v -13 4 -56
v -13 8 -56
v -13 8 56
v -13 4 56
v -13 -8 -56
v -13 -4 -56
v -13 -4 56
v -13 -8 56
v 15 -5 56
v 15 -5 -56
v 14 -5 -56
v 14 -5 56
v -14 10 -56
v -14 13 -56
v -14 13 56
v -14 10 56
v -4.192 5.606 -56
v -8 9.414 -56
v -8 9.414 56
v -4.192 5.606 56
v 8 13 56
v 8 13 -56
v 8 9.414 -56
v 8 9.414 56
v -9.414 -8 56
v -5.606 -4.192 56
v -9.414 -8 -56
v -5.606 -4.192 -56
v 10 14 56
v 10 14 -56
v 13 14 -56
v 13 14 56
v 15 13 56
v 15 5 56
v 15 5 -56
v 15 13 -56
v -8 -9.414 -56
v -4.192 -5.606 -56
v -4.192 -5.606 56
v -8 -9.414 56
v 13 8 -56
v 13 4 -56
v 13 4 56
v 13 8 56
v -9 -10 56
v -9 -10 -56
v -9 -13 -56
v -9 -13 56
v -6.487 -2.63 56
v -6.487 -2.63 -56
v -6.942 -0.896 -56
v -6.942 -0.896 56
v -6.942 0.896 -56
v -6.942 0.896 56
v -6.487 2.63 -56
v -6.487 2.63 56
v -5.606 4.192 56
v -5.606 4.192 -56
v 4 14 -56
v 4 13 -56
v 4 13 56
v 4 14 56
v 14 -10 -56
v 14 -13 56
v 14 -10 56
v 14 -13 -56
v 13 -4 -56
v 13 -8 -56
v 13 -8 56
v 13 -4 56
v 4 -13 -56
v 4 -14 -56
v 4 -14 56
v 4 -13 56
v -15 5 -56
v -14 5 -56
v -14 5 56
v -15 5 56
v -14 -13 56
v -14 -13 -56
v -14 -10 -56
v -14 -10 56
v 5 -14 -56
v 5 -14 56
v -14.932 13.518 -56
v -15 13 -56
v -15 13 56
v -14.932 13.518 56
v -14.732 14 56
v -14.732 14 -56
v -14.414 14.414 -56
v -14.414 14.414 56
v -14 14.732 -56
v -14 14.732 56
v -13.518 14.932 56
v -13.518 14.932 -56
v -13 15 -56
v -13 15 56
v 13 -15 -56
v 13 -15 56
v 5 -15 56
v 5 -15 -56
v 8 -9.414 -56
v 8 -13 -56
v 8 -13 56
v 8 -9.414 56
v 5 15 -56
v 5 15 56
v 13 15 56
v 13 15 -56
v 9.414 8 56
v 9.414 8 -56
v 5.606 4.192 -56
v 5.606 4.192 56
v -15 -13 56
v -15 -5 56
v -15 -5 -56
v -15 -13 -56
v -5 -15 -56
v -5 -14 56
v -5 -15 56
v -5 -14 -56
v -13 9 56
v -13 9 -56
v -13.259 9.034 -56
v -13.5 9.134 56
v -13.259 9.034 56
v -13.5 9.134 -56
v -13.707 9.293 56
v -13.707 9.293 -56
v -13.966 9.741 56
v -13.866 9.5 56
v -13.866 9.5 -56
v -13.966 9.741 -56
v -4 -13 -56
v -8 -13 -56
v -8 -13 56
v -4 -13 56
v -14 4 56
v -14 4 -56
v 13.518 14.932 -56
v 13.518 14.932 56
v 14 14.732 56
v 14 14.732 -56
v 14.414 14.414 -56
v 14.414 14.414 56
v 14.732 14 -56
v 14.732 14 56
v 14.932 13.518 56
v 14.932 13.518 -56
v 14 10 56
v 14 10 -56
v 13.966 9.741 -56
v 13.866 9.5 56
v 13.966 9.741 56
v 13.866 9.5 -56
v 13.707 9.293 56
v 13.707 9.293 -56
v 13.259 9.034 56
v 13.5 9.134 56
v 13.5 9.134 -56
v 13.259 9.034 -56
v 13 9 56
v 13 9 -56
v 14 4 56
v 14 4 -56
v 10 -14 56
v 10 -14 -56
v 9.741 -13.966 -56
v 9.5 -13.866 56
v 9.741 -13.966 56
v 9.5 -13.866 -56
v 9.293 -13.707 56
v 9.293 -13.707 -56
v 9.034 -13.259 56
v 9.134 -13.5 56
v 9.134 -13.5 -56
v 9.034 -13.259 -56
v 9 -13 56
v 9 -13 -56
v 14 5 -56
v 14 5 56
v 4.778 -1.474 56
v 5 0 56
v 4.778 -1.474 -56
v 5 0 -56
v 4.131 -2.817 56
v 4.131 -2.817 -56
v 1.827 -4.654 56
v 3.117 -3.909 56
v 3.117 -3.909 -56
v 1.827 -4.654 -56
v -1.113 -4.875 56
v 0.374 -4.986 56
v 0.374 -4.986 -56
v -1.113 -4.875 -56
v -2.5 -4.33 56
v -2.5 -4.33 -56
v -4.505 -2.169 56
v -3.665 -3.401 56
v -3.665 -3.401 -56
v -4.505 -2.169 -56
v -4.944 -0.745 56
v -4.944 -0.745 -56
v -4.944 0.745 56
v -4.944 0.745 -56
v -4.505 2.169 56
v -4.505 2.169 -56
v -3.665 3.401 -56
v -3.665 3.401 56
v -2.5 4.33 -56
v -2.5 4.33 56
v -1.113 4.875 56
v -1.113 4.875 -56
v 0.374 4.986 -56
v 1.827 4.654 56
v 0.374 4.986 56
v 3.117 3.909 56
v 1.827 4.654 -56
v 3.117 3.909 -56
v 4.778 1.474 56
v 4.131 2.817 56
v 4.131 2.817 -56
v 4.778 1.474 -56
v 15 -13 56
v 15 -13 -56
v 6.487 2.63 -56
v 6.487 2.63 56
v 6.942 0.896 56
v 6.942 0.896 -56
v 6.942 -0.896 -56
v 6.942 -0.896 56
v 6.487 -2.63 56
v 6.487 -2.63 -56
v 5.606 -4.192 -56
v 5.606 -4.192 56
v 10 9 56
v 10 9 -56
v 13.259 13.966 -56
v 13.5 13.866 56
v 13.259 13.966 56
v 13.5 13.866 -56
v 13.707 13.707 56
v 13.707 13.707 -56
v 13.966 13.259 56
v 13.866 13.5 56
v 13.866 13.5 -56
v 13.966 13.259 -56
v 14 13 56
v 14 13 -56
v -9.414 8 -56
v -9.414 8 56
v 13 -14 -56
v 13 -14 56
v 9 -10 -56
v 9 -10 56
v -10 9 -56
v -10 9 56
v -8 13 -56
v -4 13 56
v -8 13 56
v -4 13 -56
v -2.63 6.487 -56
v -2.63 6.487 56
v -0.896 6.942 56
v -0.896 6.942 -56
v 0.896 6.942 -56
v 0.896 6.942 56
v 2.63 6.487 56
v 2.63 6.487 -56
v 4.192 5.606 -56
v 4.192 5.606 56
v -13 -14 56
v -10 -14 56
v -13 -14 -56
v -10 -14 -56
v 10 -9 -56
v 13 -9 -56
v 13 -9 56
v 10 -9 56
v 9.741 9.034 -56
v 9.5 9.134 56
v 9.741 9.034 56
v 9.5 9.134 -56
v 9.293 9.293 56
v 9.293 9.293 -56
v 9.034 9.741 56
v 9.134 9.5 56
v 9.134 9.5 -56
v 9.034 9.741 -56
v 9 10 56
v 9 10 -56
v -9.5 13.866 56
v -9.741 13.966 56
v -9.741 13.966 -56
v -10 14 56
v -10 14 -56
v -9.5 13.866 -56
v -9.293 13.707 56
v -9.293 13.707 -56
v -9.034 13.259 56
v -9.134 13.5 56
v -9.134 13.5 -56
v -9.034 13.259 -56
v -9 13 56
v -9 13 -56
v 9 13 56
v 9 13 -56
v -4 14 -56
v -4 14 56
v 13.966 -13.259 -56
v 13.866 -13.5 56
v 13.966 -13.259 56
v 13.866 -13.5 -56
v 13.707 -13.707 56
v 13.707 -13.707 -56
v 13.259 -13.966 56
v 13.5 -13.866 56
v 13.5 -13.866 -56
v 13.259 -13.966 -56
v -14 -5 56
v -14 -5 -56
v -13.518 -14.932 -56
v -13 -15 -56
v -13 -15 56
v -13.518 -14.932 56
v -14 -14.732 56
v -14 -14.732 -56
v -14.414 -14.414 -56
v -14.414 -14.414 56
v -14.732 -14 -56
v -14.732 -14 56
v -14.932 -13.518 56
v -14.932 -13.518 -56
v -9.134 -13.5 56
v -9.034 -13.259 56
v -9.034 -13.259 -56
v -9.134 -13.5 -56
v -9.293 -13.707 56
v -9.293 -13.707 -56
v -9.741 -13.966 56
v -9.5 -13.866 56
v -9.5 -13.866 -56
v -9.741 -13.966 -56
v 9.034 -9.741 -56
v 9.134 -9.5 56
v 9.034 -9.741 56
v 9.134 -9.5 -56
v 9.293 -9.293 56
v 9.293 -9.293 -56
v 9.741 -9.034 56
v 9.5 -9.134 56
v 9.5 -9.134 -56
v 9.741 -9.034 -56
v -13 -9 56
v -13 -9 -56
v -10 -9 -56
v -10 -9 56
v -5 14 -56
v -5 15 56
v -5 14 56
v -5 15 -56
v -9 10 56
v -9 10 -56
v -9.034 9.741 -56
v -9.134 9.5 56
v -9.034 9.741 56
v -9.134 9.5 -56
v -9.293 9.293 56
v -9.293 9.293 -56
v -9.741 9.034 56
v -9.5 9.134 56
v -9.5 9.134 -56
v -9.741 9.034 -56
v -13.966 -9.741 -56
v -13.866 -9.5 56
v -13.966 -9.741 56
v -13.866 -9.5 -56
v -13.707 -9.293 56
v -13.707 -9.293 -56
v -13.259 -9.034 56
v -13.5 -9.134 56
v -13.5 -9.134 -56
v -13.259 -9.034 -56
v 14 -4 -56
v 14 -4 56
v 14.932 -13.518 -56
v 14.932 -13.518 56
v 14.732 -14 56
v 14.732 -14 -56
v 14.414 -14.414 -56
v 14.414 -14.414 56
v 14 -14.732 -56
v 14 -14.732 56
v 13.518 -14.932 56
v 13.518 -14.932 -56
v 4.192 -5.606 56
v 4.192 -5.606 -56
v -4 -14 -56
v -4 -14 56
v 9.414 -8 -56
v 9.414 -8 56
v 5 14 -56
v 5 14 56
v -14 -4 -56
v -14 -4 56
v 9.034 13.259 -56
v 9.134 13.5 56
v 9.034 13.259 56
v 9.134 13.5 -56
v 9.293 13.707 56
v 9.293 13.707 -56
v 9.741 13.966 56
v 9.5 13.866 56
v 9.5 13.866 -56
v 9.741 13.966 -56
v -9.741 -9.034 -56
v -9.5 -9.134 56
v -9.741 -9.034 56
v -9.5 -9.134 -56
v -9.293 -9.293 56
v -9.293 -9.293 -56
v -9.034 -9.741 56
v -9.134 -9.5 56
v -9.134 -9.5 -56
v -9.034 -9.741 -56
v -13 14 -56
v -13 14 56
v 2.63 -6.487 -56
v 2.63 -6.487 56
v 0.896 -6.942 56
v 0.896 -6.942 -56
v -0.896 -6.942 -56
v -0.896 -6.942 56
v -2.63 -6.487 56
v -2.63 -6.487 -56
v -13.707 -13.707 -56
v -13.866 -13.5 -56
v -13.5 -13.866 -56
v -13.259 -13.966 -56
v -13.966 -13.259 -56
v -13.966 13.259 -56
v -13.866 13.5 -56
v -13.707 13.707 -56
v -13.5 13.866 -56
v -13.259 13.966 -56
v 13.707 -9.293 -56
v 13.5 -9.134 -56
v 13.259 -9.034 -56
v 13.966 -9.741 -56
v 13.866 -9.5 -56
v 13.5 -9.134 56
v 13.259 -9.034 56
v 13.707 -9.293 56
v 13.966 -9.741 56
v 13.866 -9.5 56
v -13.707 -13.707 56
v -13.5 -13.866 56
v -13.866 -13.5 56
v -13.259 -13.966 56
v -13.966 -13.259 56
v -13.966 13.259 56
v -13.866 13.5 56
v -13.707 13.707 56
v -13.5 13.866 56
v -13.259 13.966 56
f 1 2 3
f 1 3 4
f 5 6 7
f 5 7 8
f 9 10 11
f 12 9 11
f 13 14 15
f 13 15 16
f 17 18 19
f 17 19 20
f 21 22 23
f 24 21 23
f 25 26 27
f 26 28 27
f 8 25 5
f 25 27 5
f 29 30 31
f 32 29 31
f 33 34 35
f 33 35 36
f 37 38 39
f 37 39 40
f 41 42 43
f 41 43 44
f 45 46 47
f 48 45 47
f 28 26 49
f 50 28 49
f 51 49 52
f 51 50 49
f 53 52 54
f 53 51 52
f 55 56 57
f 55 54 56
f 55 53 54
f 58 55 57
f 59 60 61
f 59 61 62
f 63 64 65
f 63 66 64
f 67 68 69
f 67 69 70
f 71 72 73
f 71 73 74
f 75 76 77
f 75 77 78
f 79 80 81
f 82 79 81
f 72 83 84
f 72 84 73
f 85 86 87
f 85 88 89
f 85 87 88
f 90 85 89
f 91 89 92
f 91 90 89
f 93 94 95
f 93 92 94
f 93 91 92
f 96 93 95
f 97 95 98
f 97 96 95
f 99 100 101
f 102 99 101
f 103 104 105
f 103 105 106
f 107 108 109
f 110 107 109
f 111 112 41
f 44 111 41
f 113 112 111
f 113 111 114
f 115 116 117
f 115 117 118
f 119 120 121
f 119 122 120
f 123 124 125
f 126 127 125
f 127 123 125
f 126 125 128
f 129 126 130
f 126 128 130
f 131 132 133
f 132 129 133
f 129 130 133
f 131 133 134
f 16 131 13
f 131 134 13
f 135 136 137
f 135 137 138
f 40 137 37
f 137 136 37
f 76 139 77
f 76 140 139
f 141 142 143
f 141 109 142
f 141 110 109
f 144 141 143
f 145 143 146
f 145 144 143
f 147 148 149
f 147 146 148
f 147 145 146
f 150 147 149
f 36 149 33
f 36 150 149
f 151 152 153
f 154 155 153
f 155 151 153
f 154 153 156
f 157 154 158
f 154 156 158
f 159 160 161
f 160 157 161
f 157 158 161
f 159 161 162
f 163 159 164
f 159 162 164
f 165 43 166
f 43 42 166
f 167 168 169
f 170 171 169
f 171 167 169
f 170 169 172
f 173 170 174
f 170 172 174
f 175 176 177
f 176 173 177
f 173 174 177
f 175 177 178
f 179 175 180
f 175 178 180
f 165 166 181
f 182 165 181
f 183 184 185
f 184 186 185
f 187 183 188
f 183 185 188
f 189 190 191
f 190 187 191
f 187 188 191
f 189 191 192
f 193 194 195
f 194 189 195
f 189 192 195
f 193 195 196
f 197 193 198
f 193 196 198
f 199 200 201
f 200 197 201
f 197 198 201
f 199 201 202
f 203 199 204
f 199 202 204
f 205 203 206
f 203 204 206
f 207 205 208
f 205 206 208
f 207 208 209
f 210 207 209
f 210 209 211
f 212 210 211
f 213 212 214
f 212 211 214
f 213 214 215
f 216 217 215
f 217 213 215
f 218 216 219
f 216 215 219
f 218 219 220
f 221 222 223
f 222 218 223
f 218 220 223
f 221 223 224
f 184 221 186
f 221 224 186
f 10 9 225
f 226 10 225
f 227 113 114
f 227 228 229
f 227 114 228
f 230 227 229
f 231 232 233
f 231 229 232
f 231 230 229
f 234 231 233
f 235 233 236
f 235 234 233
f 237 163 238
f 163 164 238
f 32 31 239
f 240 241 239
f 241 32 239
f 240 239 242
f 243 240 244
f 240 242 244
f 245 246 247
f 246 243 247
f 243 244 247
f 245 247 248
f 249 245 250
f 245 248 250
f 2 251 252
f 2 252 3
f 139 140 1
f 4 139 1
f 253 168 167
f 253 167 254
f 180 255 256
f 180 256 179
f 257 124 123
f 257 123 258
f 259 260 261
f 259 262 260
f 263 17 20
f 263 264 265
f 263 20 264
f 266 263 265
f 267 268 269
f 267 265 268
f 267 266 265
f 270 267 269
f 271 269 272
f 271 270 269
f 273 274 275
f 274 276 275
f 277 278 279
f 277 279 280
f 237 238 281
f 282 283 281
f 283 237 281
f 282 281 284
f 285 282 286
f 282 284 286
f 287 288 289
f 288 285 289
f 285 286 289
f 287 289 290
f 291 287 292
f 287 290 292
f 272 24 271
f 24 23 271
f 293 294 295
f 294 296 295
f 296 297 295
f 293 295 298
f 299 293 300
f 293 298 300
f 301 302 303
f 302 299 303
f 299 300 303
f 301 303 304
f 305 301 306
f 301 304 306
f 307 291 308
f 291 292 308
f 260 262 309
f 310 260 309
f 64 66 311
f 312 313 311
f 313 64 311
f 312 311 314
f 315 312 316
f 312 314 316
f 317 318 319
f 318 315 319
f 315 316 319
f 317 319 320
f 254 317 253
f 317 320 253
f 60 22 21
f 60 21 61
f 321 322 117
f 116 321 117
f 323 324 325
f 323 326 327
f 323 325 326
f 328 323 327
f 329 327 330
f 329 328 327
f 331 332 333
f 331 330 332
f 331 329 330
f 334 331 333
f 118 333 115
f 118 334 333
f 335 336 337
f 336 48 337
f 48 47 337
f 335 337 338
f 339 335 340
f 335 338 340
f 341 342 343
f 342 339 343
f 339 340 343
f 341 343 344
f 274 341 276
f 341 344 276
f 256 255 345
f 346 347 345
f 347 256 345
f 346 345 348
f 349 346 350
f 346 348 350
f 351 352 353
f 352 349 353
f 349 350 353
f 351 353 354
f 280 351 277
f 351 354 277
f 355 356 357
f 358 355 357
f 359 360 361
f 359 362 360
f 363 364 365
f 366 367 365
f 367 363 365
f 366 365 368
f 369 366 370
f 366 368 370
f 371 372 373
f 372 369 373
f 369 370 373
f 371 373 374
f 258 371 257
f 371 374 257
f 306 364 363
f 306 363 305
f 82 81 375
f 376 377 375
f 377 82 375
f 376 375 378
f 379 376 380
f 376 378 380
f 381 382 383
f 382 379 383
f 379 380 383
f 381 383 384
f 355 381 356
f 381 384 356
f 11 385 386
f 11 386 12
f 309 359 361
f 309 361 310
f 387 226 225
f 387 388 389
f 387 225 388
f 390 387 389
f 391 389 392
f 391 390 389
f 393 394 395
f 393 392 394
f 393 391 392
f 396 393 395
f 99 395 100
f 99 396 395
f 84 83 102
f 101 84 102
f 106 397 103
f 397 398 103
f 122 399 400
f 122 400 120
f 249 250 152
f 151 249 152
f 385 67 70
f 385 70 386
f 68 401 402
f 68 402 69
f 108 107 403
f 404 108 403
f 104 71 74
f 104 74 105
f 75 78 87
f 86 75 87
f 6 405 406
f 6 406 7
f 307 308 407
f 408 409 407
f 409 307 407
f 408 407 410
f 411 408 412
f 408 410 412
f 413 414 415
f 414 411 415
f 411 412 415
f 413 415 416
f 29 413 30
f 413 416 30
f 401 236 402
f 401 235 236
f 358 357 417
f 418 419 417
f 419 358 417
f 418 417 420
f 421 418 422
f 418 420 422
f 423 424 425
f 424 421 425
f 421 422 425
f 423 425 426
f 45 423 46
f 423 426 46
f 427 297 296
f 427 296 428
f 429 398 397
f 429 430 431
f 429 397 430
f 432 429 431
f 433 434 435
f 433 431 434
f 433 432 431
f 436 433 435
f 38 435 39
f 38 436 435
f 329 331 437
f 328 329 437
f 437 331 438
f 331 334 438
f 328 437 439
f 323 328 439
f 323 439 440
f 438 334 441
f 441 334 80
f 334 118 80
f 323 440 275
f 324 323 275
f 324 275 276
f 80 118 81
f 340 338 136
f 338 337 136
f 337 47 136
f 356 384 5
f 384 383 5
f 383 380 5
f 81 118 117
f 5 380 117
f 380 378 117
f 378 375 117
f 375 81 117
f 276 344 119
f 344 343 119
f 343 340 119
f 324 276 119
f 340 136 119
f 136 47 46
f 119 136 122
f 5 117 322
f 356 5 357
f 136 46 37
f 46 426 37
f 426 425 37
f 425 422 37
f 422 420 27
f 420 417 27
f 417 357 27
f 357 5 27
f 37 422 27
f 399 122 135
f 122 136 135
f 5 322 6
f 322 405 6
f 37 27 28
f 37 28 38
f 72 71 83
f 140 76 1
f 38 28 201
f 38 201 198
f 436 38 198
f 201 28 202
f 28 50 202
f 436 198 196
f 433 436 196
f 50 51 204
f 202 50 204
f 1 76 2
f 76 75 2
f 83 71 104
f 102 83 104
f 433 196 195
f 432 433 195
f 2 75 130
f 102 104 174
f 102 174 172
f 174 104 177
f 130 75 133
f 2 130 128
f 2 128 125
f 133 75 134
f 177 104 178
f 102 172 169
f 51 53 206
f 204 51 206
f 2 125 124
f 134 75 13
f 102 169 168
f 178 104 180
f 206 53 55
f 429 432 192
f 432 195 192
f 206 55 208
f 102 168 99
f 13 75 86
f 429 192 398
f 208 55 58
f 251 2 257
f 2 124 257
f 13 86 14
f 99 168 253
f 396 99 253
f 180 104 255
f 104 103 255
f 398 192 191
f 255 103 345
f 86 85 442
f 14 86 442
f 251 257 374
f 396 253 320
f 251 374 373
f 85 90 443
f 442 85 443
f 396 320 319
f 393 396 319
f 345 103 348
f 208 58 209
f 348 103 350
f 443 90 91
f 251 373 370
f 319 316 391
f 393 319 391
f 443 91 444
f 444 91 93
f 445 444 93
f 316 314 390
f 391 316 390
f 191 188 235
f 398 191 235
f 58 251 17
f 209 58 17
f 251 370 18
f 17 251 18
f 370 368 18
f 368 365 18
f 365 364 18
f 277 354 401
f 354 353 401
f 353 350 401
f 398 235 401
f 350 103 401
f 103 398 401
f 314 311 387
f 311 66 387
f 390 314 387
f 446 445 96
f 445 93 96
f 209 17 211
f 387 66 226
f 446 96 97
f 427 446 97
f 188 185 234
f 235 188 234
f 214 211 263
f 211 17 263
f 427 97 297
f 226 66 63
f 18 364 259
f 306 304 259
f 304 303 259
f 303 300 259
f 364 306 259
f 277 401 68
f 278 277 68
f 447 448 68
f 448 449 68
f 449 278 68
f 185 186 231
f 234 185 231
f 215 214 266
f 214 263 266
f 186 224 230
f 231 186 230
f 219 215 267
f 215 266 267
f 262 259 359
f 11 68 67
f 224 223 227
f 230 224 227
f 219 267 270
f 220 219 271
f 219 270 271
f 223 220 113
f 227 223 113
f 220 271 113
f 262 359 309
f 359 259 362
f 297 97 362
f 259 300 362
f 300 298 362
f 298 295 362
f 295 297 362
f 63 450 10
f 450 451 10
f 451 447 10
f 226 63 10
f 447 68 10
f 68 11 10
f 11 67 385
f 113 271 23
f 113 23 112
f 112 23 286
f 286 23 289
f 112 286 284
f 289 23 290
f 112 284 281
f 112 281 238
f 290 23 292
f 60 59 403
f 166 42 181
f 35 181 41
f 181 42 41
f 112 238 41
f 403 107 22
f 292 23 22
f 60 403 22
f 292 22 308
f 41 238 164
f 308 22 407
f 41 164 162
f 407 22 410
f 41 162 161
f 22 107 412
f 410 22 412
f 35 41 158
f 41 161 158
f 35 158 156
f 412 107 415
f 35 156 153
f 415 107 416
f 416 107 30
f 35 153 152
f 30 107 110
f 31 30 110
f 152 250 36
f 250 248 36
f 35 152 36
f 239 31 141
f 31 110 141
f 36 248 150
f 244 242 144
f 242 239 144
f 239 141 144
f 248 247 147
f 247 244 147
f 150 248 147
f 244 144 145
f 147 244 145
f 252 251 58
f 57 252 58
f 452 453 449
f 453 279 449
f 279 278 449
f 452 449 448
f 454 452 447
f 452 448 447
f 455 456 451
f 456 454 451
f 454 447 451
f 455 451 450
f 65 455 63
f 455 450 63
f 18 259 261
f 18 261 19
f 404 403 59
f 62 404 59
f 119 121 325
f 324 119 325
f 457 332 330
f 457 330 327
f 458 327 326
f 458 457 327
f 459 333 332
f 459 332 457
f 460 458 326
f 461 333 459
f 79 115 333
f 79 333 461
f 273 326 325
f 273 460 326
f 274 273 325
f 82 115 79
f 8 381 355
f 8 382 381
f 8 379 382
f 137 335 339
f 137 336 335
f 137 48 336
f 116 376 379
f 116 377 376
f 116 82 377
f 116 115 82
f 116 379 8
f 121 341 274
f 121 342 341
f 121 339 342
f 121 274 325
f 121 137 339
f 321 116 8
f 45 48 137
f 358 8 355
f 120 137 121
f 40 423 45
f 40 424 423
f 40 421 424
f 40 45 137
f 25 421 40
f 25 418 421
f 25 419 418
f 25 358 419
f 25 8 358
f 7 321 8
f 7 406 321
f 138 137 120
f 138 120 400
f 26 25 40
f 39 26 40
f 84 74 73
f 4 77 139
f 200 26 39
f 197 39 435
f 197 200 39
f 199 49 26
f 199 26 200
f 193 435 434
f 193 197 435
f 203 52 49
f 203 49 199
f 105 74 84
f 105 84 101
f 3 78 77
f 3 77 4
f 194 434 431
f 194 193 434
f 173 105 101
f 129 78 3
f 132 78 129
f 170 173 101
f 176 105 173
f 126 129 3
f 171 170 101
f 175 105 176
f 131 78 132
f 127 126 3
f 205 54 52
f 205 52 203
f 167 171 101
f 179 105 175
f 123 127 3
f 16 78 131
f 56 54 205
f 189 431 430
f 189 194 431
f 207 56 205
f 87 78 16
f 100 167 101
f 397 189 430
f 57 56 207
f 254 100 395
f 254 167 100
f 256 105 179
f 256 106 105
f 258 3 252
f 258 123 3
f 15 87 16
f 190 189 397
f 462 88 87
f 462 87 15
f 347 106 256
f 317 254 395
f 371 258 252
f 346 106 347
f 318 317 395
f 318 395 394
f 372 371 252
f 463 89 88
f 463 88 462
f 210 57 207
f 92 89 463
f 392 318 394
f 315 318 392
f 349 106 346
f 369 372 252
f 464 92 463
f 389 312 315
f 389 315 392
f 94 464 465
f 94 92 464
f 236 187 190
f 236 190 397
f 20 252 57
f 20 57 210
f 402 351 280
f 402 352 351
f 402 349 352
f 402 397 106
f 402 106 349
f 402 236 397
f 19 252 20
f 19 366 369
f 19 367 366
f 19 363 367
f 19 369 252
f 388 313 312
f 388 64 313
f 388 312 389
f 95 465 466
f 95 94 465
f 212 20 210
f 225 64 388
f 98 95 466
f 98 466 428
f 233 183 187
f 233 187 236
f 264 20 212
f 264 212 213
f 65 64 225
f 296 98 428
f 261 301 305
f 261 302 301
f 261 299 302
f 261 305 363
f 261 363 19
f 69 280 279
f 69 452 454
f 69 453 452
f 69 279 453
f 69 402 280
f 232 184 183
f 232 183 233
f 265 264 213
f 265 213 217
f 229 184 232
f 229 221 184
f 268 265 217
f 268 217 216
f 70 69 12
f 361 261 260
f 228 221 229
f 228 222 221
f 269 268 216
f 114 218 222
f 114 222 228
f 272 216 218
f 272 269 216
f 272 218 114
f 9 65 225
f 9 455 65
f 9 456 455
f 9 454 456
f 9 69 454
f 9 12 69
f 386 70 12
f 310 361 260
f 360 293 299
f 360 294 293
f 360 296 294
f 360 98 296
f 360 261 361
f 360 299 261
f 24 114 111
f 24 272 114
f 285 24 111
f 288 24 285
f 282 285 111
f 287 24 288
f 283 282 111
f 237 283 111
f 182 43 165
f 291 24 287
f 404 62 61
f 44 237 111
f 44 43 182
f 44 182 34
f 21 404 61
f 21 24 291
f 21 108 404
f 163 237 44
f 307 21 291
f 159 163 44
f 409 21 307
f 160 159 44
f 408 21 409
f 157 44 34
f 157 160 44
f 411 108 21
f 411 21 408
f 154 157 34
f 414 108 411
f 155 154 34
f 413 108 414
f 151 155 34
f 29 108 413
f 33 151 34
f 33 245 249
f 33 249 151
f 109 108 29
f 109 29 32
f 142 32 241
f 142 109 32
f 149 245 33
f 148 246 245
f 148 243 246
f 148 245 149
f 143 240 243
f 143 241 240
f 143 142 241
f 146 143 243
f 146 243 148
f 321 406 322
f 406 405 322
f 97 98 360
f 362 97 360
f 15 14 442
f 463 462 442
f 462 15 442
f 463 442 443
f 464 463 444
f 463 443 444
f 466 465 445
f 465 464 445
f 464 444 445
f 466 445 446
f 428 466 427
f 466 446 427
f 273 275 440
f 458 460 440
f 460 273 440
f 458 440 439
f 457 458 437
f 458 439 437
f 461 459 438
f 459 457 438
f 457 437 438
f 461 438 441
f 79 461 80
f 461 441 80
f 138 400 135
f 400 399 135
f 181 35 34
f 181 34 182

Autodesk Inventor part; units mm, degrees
ref_plane "YZ Plane" through (0, 0, 0) normal (1, 0, 0) x (0, 1, 0)
ref_plane "XZ Plane" through (0, 0, 0) normal (0, 1, 0) x (-1, 0, 0)
ref_plane "XY Plane" through (0, 0, 0) normal (0, 0, 1) x (1, 0, 0)
sketch "Sketch1" plane through (0, 0, 0) normal (0, 0, 1) x (1, 0, 0)
  circle A0 centre (0, 0) radius 5
  arc A1 (-13, 15) -> (-15, 13) centre (-13, 13) ccw
  arc A2 (-15, -13) -> (-13, -15) centre (-13, -13) ccw
  arc A3 (13, -15) -> (15, -13) centre (13, -13) ccw
  arc A4 (15, 13) -> (13, 15) centre (13, 13) ccw
  arc A5 (-13, 14) -> (-14, 13) centre (-13, 13) ccw
  arc A6 (-14, -13) -> (-13, -14) centre (-13, -13) ccw
  arc A7 (13, -14) -> (14, -13) centre (13, -13) ccw
  arc A8 (14, 13) -> (13, 14) centre (13, 13) ccw
  line L0 (14, -14) -> (-14, 14) construction
  line L1 (-14, -14) -> (14, 14) construction
  line L2 (15, -15) -> (-15, 15) construction
  line L3 (-15, -15) -> (15, 15) construction
  line L4 (-13, 15) -> (-8, 15)
  line L5 (-8, 13) -> (-8, 8) construction
  line L6 (-9.4142, 8) -> (-13, 8)
  line L7 (-15, 8) -> (-15, 13)
  line L8 (-13, -15) -> (-8, -15)
  line L9 (-8, -13) -> (-8, -9.4142)
  line L10 (-9.4142, -8) -> (-13, -8)
  line L11 (-15, -8) -> (-15, -13)
  line L12 (13, -15) -> (8, -15)
  line L13 (8, -13) -> (8, -9.4142)
  line L14 (9.4142, -8) -> (13, -8)
  line L15 (15, -8) -> (15, -13)
  line L16 (13, 15) -> (8, 15)
  line L17 (8, 13) -> (8, 9.4142)
  line L18 (9.4142, 8) -> (13, 8)
  line L19 (15, 8) -> (15, 13)
  line L20 (-13, 9) -> (-10, 9)
  line L21 (-9, 10) -> (-9, 13)
  line L22 (-10, 14) -> (-13, 14)
  line L23 (-14, 13) -> (-14, 10)
  line L24 (13, 9) -> (10, 9)
  line L25 (9, 10) -> (9, 13)
  line L26 (10, 14) -> (13, 14)
  line L27 (14, 13) -> (14, 10)
  line L28 (13, -9) -> (10, -9)
  line L29 (9, -10) -> (9, -13)
  line L30 (10, -14) -> (13, -14)
  line L31 (14, -13) -> (14, -10)
  line L32 (-13, -9) -> (-10, -9)
  line L33 (-9, -10) -> (-9, -13)
  line L34 (-10, -14) -> (-13, -14)
  line L35 (-14, -13) -> (-14, -10)
  line L36 (-14, 13) -> (-14, 10)
  line L37 (-14, -10) -> (-14, -13)
  line L38 (-14, -13) -> (-14, -10)
  line L39 (-14, 10) -> (-14, 13)
  line L40 (13, -15) -> (5, -15)
  line L41 (-5, -15) -> (-13, -15)
  line L42 (13, -15) -> (5, -15) construction
  line L43 (0, -15) -> (-13, -15) construction
  line L44 (4, -13) -> (8, -13)
  line L45 (-8, -13) -> (-4, -13)
  line L46 (10, -9) -> (13, -9)
  line L47 (14, -10) -> (14, -13)
  line L48 (13, -14) -> (10, -14)
  line L49 (9, -13) -> (9, -10)
  line L50 (5, -14) -> (5, -15)
  line L51 (13, -14) -> (10, -14)
  line L52 (5, -14) -> (4, -14)
  line L53 (4, -14) -> (5, -14)
  line L54 (10, -14) -> (13, -14)
  line L55 (-4, -14) -> (-5, -14)
  line L56 (-10, -14) -> (-13, -14)
  line L57 (-13, -14) -> (-10, -14)
  line L58 (-5, -14) -> (-4, -14)
  line L59 (14, -13) -> (14, -10)
  line L60 (14, 10) -> (14, 13)
  line L61 (14, 13) -> (14, 10)
  line L62 (14, -10) -> (14, -13)
  line L63 (-5, -14) -> (-5, -15)
  line L64 (10, 14) -> (13, 14)
  line L65 (13, 14) -> (10, 14)
  line L66 (-10, 14) -> (-13, 14)
  line L67 (-13, 14) -> (-10, 14)
  line L68 (-5, 15) -> (-5, 14)
  line L69 (-13, 15) -> (-5, 15)
  line L70 (5, 15) -> (13, 15)
  line L71 (-15, 15) -> (-5, 15) construction
  line L72 (5, 15) -> (15, 15) construction
  line L73 (5, 15) -> (5, 14)
  line L74 (8, 13) -> (4, 13)
  line L75 (5, 14) -> (4, 14)
  line L76 (-5, 14) -> (-4, 14)
  line L77 (4, 14) -> (5, 14)
  line L78 (-4, 13) -> (-8, 13)
  line L79 (-4, 14) -> (-5, 14)
  line L80 (4, 13) -> (4, 14)
  line L81 (-4, 13) -> (-4, 14)
  line L82 (-4, -14) -> (-4, -13)
  line L83 (4, -14) -> (4, -13)
  line L84 (-8, 9.4142) -> (-4.1919, 5.6061)
  line L85 (8, 9.4142) -> (4.1919, 5.6061)
  line L86 (9.4142, 8) -> (5.6061, 4.1919)
  line L87 (5.6061, -4.1919) -> (9.4142, -8)
  line L88 (4.1919, -5.6061) -> (8, -9.4142)
  line L89 (-4.1919, -5.6061) -> (-8, -9.4142)
  line L90 (-5.6061, -4.1919) -> (-9.4142, -8)
  line L91 (-9.4142, 8) -> (-5.6061, 4.1919)
  arc A9 (4.1919, 5.6061) -> (-4.1919, 5.6061) centre (0, 0) ccw
  arc A10 (5.6061, -4.1919) -> (5.6061, 4.1919) centre (0, 0) ccw
  arc A11 (-5.6061, 4.1919) -> (-5.6061, -4.1919) centre (0, 0) ccw
  arc A12 (-4.1919, -5.6061) -> (4.1919, -5.6061) centre (0, 0) ccw
  line L92 (-8, 13) -> (-8, 9.4142)
  line L93 (-15, -13) -> (-15, -5) construction
  line L94 (-15, -13) -> (-15, -5)
  line L95 (-15, 5) -> (-15, 13)
  line L96 (15, -5) -> (15, -13) construction
  line L97 (15, 13) -> (15, 5)
  line L98 (15, -5) -> (15, -13)
  line L99 (-14, -4) -> (-14, -5)
  line L100 (14, -4) -> (14, -5)
  line L101 (14, 4) -> (14, 5)
  line L102 (-14, 4) -> (-14, 5)
  line L103 (-13, 8) -> (-13, 4)
  line L104 (13, 4) -> (13, 8)
  line L105 (13, -8) -> (13, -4)
  line L106 (-13, -4) -> (-13, -8)
  line L107 (-14, -5) -> (-15, -5)
  line L108 (15, -5) -> (14, -5)
  line L109 (15, 5) -> (14, 5)
  line L110 (-14, 5) -> (-15, 5)
  line L111 (13, 4) -> (14, 4)
  line L112 (-14, 4) -> (-13, 4)
  line L113 (-14, -4) -> (-13, -4)
  line L114 (13, -4) -> (14, -4)
  arc A13 (-13, -9) -> (-14, -10) centre (-13, -10) ccw
  arc A14 (-9, -10) -> (-10, -9) centre (-10, -10) ccw
  arc A15 (-10, -14) -> (-9, -13) centre (-10, -13) ccw
  arc A16 (10, -9) -> (9, -10) centre (10, -10) ccw
  arc A17 (9, -13) -> (10, -14) centre (10, -13) ccw
  arc A18 (14, -10) -> (13, -9) centre (13, -10) ccw
  arc A19 (10, 14) -> (9, 13) centre (10, 13) ccw
  arc A20 (9, 10) -> (10, 9) centre (10, 10) ccw
  arc A21 (13, 9) -> (14, 10) centre (13, 10) ccw
  arc A22 (-9, 13) -> (-10, 14) centre (-10, 13) ccw
  arc A23 (-10, 9) -> (-9, 10) centre (-10, 10) ccw
  arc A24 (-14, 10) -> (-13, 9) centre (-13, 10) ccw
  point P0 (15, -15)
  point P1 (-5.5858, -7)
  dimension "d0" = 30
  dimension "d1" = 30
  dimension "d2" = 10
  dimension "d4" = 2
  dimension "d11" = 28
  dimension "d12" = 7
  dimension "d13" = 7
  dimension "d15" = 1
  dimension "d16" = 1
  dimension "d17" = 1
  dimension "d18" = 1
  dimension "d19" = 5
  dimension "d23" = 30
  dimension "d27" = 1
  dimension "d30" = 3.5858
  dimension "d31" = 2
  dimension "d32" = 16
  dimension "d33" = 8
  dimension "d34" = 6
  dimension "d35" = 5.5858
extrude "Extrusion1" add sketch "Sketch1" along normal mid plane 112
equation "\"d1\" = d0"
properties part number "3030T-slot(hor)" material "Aluminum 6061"
